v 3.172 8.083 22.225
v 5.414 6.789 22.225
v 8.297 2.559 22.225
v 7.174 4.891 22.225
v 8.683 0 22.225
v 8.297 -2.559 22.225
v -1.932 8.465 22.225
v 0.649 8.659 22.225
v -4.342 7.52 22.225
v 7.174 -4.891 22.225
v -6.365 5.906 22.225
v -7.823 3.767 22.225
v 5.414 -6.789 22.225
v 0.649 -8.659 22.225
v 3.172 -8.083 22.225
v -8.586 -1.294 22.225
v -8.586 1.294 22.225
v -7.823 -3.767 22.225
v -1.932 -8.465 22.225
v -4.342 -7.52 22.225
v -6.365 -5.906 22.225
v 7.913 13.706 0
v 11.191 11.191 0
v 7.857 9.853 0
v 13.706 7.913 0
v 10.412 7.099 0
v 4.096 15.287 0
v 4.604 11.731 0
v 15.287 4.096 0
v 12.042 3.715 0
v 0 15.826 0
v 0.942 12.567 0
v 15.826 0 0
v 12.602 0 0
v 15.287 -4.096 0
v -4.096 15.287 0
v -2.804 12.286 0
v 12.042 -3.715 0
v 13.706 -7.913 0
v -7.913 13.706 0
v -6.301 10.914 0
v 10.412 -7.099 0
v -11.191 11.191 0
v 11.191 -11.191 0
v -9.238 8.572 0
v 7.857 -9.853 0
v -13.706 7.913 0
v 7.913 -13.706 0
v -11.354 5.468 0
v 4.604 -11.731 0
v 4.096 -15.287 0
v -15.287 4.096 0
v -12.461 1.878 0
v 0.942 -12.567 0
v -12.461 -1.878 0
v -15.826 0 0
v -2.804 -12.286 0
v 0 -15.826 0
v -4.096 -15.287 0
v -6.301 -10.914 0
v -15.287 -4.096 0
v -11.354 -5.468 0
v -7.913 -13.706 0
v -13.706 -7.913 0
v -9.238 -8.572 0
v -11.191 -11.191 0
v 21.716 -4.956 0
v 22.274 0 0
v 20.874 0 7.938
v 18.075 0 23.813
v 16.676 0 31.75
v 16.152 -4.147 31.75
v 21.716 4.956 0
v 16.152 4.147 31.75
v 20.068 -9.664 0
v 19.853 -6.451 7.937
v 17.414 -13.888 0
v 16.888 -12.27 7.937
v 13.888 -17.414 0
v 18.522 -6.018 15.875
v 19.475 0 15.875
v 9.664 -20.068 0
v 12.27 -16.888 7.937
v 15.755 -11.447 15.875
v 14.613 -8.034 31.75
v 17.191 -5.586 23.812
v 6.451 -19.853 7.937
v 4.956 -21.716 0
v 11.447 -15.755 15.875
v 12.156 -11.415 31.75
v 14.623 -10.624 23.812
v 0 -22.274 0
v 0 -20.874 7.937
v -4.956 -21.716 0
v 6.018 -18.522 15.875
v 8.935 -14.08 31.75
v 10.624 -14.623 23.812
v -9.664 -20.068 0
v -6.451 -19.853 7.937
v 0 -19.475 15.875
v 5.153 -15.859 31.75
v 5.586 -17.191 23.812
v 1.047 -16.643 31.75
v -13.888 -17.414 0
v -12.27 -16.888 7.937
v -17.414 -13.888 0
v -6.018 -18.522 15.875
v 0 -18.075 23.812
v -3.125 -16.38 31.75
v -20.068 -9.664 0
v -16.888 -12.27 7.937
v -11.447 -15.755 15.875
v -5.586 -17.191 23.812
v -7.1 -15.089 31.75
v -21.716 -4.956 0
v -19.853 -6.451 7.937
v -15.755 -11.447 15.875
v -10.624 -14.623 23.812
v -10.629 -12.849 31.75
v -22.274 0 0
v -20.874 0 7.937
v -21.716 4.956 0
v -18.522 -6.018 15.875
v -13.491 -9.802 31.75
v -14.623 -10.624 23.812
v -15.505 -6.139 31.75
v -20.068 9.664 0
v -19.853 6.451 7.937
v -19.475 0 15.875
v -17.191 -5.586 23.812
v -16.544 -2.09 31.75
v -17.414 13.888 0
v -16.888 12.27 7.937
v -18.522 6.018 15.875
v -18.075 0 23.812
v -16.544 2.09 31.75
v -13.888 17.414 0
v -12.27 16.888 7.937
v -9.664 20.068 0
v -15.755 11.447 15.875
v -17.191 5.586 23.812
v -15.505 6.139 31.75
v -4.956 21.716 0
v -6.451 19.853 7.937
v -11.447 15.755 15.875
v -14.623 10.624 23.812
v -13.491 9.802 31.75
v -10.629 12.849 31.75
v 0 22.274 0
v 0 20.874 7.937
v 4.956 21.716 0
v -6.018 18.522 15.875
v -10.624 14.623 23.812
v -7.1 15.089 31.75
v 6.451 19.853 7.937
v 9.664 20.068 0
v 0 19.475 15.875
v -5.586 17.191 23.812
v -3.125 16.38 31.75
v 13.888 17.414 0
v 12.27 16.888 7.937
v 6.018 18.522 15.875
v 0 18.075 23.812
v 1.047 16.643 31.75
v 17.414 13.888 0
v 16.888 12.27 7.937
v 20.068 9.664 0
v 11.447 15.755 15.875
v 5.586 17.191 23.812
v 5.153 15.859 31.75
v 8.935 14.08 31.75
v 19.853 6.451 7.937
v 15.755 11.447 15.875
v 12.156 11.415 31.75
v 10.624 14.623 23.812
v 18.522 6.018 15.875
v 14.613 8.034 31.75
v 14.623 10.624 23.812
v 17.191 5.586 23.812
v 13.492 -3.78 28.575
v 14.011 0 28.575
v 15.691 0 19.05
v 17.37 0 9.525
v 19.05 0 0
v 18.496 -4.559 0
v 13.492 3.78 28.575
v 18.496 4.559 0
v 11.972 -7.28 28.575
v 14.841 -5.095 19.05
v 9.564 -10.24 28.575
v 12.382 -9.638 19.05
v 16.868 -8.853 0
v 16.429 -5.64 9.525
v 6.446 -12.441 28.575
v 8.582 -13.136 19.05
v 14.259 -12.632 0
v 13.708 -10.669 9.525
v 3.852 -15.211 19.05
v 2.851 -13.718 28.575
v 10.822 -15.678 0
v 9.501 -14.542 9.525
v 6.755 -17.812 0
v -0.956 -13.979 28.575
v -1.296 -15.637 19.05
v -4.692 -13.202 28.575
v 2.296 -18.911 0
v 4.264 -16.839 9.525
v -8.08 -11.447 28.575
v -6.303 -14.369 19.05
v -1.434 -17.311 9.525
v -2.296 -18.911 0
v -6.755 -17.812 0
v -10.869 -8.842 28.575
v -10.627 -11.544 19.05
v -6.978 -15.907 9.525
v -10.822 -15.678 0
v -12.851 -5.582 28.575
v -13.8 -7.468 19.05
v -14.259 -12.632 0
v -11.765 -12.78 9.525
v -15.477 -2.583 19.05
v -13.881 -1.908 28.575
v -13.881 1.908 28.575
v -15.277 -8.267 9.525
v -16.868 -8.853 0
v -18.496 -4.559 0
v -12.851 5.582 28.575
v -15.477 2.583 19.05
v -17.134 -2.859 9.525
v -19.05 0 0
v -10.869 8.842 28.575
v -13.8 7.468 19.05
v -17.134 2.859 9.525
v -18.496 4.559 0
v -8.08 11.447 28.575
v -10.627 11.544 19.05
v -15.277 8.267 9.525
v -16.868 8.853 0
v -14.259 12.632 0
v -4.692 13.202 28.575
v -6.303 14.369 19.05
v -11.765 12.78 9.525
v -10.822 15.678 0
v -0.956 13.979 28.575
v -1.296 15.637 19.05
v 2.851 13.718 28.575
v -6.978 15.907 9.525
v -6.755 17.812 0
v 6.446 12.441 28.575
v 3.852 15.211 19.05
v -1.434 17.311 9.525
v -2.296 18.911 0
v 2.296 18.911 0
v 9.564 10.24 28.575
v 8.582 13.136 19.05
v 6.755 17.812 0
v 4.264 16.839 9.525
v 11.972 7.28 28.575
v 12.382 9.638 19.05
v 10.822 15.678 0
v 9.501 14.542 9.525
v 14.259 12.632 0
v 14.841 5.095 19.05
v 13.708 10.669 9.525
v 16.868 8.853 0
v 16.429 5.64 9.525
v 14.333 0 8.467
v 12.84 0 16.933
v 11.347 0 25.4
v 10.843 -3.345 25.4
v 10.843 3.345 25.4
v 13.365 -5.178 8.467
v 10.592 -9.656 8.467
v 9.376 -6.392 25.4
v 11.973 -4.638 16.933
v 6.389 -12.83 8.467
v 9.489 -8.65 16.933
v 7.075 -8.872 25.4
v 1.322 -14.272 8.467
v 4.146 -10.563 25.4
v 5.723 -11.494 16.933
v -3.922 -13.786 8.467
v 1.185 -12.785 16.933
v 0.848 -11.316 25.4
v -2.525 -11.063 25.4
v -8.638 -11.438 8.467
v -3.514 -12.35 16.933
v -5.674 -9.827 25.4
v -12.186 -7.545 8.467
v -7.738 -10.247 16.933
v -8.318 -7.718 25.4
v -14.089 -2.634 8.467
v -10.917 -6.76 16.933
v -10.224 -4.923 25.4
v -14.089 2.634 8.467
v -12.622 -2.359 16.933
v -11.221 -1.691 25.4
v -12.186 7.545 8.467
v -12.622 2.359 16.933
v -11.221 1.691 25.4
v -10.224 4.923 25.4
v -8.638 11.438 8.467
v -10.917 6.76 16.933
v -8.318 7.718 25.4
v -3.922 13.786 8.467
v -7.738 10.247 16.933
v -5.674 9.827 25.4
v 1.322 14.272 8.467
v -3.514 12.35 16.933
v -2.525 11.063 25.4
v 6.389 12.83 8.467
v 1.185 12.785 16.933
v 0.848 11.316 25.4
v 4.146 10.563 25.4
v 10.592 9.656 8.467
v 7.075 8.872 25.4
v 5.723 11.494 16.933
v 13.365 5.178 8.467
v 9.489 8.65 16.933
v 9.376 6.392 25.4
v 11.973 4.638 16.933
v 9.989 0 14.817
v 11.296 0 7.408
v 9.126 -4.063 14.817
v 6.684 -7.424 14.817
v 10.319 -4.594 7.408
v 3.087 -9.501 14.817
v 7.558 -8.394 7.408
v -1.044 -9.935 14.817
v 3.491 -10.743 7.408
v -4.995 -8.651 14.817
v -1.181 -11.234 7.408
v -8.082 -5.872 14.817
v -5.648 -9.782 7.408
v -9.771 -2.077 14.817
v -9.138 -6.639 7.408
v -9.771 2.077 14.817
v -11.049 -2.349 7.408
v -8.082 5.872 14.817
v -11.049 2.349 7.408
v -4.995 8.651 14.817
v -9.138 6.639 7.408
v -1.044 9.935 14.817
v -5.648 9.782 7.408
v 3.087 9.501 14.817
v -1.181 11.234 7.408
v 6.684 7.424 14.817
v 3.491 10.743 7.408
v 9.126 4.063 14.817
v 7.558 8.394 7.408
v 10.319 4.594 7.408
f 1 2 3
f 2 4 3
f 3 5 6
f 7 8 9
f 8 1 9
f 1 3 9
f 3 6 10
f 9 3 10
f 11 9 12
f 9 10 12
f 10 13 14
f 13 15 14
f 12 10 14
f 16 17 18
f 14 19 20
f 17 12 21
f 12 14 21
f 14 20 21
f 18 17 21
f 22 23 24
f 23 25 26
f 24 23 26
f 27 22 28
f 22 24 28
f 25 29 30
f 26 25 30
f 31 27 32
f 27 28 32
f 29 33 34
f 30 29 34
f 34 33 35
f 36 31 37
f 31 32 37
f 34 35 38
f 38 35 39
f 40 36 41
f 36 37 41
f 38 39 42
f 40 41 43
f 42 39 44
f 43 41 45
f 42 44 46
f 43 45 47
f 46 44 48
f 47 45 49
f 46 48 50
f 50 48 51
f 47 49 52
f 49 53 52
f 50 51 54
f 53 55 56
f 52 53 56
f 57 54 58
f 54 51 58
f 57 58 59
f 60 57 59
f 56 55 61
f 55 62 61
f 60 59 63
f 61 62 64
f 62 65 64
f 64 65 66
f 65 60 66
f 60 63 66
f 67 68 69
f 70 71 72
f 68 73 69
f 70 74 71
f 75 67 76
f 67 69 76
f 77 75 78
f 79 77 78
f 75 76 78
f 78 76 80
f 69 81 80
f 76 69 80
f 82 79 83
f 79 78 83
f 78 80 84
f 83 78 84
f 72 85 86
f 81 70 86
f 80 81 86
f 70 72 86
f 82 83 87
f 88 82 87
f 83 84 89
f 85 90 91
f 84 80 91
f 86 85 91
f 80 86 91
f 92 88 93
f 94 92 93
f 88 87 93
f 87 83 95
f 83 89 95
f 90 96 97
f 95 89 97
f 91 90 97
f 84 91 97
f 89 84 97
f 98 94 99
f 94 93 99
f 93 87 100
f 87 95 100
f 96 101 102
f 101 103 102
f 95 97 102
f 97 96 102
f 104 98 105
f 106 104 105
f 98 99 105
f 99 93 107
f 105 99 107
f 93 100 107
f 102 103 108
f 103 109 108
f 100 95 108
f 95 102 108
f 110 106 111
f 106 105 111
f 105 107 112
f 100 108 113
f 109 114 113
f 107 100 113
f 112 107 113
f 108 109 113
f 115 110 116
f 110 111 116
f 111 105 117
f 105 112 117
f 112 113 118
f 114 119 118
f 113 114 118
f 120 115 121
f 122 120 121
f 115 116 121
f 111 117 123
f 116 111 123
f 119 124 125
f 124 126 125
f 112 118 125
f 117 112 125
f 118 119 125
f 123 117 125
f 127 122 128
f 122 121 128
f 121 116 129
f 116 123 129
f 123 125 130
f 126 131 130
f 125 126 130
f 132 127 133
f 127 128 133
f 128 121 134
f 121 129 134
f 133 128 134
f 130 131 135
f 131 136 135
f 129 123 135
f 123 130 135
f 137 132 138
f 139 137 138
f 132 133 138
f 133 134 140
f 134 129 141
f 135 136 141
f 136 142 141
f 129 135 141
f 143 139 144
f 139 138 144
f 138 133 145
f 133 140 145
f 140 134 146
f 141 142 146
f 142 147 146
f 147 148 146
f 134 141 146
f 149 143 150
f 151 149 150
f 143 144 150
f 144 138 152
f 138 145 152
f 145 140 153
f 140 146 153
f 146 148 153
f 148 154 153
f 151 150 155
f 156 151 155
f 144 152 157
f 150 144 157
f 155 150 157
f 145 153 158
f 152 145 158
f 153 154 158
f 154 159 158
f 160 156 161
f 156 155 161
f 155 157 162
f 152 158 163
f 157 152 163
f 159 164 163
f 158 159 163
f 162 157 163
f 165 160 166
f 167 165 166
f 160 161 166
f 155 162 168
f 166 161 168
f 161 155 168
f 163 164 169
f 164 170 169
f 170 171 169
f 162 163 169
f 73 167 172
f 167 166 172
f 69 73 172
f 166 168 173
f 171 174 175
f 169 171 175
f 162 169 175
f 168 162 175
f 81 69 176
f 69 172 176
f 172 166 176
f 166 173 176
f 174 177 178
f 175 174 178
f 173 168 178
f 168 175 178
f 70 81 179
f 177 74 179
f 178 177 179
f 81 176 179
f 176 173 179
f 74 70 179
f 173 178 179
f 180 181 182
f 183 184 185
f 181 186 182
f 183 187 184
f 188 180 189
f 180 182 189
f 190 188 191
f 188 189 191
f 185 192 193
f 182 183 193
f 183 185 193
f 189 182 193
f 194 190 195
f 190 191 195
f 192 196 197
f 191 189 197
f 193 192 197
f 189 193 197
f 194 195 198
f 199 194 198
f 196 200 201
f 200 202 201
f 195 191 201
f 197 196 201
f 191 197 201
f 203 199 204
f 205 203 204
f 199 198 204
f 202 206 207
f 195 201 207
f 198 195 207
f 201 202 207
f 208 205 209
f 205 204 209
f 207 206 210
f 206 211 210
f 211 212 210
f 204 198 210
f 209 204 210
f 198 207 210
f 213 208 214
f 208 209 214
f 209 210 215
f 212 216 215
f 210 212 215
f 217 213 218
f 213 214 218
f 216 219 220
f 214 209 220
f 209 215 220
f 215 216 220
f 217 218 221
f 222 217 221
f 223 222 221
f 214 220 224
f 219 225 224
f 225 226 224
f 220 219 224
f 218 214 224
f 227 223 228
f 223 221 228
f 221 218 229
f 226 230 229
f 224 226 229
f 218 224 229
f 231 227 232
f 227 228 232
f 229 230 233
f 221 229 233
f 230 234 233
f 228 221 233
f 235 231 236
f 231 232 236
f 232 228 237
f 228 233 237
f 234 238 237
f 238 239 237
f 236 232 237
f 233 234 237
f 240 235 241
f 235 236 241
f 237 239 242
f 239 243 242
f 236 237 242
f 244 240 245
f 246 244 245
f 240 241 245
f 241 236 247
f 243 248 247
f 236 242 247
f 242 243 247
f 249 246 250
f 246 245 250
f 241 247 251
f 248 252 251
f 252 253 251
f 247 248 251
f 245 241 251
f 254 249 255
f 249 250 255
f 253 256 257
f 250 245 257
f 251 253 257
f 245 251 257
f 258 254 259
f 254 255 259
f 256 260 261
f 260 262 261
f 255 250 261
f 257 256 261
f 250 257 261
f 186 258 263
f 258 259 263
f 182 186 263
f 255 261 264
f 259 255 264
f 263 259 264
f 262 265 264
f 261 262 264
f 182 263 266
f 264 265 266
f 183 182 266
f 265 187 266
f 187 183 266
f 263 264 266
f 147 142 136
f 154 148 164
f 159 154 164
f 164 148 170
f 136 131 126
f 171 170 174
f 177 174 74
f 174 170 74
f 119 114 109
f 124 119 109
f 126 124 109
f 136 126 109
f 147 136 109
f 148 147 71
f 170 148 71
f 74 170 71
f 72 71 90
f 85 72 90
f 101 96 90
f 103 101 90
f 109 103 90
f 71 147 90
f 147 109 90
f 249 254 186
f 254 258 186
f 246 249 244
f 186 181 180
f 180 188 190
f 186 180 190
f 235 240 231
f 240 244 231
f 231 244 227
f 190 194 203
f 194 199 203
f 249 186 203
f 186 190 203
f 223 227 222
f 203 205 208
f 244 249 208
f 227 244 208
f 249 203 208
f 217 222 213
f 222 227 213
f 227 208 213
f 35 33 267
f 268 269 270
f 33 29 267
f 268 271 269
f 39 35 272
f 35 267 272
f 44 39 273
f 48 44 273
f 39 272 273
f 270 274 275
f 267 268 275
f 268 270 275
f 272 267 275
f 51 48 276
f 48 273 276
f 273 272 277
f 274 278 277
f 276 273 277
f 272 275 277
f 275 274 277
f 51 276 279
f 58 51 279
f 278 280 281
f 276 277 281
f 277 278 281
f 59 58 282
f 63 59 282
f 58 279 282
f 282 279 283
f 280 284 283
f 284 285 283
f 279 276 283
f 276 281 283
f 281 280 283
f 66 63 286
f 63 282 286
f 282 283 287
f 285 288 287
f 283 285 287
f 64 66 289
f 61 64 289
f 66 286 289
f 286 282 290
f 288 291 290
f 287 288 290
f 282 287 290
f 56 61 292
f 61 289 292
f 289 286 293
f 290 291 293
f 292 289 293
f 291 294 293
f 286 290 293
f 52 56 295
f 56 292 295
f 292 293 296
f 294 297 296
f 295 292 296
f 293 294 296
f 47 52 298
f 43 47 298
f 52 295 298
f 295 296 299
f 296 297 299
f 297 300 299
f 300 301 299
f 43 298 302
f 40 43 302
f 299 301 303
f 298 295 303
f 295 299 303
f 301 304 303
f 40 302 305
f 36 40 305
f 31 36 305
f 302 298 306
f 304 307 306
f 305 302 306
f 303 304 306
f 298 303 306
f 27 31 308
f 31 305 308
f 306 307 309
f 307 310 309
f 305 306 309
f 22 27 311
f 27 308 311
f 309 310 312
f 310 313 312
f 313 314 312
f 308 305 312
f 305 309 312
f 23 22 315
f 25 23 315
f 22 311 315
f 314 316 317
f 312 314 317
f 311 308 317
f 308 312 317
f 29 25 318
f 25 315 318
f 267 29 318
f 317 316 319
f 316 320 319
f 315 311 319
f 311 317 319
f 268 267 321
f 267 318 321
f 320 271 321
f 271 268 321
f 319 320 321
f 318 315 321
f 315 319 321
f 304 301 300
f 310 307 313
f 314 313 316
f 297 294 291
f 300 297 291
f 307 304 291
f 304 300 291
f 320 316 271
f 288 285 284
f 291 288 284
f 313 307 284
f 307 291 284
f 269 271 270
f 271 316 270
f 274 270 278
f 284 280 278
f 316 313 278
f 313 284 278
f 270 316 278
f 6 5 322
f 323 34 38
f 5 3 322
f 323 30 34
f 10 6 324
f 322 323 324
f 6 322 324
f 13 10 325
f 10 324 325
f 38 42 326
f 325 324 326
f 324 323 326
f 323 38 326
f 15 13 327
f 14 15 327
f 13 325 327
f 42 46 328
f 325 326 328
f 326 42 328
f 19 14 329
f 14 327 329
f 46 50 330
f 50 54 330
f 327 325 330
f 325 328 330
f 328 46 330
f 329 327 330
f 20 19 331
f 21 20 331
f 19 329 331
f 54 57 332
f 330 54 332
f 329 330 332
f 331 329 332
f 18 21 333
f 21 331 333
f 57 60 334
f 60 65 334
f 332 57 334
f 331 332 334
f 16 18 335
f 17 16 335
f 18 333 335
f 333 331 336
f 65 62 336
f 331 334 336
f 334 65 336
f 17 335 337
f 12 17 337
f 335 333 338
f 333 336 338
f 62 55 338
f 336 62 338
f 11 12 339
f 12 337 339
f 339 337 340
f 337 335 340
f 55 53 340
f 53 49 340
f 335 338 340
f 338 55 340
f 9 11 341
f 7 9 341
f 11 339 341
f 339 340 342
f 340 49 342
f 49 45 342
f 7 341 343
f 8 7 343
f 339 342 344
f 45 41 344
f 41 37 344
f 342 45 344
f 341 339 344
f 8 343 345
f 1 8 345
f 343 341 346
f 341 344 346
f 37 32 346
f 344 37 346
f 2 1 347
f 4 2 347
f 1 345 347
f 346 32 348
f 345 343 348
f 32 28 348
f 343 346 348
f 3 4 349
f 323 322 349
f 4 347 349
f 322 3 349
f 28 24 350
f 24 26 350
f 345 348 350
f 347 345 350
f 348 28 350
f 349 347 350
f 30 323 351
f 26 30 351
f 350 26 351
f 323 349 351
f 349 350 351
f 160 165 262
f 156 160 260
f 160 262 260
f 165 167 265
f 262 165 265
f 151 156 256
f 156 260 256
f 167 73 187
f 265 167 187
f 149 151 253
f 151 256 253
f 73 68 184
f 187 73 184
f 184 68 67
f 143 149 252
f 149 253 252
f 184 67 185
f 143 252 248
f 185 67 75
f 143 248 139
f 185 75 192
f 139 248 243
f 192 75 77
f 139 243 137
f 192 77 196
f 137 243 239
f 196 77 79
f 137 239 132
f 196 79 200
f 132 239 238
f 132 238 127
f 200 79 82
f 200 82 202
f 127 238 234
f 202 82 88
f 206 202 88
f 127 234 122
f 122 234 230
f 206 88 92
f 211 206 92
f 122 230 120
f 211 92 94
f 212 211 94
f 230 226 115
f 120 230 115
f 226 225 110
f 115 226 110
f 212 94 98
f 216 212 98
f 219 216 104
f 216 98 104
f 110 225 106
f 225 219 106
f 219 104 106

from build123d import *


with BuildPart() as f1:
    # F0 (on Front) → F1 (revolve)
    with BuildSketch(Plane.XZ):
        Polygon((14.011457, 28.575), (19.05, 0), (22.273979, 0), (16.675598, 31.75), (0, 31.75), (0, 28.575), align=None)
        Polygon((15.826021, 0), (11.347315, 25.4), (0, 25.4), (0, 22.225), (8.683174, 22.225), (12.602041, 0), align=None)
    revolve(axis=Axis((0, 0, 30.1625), (0, 0, -1)))


solid = f1.part
